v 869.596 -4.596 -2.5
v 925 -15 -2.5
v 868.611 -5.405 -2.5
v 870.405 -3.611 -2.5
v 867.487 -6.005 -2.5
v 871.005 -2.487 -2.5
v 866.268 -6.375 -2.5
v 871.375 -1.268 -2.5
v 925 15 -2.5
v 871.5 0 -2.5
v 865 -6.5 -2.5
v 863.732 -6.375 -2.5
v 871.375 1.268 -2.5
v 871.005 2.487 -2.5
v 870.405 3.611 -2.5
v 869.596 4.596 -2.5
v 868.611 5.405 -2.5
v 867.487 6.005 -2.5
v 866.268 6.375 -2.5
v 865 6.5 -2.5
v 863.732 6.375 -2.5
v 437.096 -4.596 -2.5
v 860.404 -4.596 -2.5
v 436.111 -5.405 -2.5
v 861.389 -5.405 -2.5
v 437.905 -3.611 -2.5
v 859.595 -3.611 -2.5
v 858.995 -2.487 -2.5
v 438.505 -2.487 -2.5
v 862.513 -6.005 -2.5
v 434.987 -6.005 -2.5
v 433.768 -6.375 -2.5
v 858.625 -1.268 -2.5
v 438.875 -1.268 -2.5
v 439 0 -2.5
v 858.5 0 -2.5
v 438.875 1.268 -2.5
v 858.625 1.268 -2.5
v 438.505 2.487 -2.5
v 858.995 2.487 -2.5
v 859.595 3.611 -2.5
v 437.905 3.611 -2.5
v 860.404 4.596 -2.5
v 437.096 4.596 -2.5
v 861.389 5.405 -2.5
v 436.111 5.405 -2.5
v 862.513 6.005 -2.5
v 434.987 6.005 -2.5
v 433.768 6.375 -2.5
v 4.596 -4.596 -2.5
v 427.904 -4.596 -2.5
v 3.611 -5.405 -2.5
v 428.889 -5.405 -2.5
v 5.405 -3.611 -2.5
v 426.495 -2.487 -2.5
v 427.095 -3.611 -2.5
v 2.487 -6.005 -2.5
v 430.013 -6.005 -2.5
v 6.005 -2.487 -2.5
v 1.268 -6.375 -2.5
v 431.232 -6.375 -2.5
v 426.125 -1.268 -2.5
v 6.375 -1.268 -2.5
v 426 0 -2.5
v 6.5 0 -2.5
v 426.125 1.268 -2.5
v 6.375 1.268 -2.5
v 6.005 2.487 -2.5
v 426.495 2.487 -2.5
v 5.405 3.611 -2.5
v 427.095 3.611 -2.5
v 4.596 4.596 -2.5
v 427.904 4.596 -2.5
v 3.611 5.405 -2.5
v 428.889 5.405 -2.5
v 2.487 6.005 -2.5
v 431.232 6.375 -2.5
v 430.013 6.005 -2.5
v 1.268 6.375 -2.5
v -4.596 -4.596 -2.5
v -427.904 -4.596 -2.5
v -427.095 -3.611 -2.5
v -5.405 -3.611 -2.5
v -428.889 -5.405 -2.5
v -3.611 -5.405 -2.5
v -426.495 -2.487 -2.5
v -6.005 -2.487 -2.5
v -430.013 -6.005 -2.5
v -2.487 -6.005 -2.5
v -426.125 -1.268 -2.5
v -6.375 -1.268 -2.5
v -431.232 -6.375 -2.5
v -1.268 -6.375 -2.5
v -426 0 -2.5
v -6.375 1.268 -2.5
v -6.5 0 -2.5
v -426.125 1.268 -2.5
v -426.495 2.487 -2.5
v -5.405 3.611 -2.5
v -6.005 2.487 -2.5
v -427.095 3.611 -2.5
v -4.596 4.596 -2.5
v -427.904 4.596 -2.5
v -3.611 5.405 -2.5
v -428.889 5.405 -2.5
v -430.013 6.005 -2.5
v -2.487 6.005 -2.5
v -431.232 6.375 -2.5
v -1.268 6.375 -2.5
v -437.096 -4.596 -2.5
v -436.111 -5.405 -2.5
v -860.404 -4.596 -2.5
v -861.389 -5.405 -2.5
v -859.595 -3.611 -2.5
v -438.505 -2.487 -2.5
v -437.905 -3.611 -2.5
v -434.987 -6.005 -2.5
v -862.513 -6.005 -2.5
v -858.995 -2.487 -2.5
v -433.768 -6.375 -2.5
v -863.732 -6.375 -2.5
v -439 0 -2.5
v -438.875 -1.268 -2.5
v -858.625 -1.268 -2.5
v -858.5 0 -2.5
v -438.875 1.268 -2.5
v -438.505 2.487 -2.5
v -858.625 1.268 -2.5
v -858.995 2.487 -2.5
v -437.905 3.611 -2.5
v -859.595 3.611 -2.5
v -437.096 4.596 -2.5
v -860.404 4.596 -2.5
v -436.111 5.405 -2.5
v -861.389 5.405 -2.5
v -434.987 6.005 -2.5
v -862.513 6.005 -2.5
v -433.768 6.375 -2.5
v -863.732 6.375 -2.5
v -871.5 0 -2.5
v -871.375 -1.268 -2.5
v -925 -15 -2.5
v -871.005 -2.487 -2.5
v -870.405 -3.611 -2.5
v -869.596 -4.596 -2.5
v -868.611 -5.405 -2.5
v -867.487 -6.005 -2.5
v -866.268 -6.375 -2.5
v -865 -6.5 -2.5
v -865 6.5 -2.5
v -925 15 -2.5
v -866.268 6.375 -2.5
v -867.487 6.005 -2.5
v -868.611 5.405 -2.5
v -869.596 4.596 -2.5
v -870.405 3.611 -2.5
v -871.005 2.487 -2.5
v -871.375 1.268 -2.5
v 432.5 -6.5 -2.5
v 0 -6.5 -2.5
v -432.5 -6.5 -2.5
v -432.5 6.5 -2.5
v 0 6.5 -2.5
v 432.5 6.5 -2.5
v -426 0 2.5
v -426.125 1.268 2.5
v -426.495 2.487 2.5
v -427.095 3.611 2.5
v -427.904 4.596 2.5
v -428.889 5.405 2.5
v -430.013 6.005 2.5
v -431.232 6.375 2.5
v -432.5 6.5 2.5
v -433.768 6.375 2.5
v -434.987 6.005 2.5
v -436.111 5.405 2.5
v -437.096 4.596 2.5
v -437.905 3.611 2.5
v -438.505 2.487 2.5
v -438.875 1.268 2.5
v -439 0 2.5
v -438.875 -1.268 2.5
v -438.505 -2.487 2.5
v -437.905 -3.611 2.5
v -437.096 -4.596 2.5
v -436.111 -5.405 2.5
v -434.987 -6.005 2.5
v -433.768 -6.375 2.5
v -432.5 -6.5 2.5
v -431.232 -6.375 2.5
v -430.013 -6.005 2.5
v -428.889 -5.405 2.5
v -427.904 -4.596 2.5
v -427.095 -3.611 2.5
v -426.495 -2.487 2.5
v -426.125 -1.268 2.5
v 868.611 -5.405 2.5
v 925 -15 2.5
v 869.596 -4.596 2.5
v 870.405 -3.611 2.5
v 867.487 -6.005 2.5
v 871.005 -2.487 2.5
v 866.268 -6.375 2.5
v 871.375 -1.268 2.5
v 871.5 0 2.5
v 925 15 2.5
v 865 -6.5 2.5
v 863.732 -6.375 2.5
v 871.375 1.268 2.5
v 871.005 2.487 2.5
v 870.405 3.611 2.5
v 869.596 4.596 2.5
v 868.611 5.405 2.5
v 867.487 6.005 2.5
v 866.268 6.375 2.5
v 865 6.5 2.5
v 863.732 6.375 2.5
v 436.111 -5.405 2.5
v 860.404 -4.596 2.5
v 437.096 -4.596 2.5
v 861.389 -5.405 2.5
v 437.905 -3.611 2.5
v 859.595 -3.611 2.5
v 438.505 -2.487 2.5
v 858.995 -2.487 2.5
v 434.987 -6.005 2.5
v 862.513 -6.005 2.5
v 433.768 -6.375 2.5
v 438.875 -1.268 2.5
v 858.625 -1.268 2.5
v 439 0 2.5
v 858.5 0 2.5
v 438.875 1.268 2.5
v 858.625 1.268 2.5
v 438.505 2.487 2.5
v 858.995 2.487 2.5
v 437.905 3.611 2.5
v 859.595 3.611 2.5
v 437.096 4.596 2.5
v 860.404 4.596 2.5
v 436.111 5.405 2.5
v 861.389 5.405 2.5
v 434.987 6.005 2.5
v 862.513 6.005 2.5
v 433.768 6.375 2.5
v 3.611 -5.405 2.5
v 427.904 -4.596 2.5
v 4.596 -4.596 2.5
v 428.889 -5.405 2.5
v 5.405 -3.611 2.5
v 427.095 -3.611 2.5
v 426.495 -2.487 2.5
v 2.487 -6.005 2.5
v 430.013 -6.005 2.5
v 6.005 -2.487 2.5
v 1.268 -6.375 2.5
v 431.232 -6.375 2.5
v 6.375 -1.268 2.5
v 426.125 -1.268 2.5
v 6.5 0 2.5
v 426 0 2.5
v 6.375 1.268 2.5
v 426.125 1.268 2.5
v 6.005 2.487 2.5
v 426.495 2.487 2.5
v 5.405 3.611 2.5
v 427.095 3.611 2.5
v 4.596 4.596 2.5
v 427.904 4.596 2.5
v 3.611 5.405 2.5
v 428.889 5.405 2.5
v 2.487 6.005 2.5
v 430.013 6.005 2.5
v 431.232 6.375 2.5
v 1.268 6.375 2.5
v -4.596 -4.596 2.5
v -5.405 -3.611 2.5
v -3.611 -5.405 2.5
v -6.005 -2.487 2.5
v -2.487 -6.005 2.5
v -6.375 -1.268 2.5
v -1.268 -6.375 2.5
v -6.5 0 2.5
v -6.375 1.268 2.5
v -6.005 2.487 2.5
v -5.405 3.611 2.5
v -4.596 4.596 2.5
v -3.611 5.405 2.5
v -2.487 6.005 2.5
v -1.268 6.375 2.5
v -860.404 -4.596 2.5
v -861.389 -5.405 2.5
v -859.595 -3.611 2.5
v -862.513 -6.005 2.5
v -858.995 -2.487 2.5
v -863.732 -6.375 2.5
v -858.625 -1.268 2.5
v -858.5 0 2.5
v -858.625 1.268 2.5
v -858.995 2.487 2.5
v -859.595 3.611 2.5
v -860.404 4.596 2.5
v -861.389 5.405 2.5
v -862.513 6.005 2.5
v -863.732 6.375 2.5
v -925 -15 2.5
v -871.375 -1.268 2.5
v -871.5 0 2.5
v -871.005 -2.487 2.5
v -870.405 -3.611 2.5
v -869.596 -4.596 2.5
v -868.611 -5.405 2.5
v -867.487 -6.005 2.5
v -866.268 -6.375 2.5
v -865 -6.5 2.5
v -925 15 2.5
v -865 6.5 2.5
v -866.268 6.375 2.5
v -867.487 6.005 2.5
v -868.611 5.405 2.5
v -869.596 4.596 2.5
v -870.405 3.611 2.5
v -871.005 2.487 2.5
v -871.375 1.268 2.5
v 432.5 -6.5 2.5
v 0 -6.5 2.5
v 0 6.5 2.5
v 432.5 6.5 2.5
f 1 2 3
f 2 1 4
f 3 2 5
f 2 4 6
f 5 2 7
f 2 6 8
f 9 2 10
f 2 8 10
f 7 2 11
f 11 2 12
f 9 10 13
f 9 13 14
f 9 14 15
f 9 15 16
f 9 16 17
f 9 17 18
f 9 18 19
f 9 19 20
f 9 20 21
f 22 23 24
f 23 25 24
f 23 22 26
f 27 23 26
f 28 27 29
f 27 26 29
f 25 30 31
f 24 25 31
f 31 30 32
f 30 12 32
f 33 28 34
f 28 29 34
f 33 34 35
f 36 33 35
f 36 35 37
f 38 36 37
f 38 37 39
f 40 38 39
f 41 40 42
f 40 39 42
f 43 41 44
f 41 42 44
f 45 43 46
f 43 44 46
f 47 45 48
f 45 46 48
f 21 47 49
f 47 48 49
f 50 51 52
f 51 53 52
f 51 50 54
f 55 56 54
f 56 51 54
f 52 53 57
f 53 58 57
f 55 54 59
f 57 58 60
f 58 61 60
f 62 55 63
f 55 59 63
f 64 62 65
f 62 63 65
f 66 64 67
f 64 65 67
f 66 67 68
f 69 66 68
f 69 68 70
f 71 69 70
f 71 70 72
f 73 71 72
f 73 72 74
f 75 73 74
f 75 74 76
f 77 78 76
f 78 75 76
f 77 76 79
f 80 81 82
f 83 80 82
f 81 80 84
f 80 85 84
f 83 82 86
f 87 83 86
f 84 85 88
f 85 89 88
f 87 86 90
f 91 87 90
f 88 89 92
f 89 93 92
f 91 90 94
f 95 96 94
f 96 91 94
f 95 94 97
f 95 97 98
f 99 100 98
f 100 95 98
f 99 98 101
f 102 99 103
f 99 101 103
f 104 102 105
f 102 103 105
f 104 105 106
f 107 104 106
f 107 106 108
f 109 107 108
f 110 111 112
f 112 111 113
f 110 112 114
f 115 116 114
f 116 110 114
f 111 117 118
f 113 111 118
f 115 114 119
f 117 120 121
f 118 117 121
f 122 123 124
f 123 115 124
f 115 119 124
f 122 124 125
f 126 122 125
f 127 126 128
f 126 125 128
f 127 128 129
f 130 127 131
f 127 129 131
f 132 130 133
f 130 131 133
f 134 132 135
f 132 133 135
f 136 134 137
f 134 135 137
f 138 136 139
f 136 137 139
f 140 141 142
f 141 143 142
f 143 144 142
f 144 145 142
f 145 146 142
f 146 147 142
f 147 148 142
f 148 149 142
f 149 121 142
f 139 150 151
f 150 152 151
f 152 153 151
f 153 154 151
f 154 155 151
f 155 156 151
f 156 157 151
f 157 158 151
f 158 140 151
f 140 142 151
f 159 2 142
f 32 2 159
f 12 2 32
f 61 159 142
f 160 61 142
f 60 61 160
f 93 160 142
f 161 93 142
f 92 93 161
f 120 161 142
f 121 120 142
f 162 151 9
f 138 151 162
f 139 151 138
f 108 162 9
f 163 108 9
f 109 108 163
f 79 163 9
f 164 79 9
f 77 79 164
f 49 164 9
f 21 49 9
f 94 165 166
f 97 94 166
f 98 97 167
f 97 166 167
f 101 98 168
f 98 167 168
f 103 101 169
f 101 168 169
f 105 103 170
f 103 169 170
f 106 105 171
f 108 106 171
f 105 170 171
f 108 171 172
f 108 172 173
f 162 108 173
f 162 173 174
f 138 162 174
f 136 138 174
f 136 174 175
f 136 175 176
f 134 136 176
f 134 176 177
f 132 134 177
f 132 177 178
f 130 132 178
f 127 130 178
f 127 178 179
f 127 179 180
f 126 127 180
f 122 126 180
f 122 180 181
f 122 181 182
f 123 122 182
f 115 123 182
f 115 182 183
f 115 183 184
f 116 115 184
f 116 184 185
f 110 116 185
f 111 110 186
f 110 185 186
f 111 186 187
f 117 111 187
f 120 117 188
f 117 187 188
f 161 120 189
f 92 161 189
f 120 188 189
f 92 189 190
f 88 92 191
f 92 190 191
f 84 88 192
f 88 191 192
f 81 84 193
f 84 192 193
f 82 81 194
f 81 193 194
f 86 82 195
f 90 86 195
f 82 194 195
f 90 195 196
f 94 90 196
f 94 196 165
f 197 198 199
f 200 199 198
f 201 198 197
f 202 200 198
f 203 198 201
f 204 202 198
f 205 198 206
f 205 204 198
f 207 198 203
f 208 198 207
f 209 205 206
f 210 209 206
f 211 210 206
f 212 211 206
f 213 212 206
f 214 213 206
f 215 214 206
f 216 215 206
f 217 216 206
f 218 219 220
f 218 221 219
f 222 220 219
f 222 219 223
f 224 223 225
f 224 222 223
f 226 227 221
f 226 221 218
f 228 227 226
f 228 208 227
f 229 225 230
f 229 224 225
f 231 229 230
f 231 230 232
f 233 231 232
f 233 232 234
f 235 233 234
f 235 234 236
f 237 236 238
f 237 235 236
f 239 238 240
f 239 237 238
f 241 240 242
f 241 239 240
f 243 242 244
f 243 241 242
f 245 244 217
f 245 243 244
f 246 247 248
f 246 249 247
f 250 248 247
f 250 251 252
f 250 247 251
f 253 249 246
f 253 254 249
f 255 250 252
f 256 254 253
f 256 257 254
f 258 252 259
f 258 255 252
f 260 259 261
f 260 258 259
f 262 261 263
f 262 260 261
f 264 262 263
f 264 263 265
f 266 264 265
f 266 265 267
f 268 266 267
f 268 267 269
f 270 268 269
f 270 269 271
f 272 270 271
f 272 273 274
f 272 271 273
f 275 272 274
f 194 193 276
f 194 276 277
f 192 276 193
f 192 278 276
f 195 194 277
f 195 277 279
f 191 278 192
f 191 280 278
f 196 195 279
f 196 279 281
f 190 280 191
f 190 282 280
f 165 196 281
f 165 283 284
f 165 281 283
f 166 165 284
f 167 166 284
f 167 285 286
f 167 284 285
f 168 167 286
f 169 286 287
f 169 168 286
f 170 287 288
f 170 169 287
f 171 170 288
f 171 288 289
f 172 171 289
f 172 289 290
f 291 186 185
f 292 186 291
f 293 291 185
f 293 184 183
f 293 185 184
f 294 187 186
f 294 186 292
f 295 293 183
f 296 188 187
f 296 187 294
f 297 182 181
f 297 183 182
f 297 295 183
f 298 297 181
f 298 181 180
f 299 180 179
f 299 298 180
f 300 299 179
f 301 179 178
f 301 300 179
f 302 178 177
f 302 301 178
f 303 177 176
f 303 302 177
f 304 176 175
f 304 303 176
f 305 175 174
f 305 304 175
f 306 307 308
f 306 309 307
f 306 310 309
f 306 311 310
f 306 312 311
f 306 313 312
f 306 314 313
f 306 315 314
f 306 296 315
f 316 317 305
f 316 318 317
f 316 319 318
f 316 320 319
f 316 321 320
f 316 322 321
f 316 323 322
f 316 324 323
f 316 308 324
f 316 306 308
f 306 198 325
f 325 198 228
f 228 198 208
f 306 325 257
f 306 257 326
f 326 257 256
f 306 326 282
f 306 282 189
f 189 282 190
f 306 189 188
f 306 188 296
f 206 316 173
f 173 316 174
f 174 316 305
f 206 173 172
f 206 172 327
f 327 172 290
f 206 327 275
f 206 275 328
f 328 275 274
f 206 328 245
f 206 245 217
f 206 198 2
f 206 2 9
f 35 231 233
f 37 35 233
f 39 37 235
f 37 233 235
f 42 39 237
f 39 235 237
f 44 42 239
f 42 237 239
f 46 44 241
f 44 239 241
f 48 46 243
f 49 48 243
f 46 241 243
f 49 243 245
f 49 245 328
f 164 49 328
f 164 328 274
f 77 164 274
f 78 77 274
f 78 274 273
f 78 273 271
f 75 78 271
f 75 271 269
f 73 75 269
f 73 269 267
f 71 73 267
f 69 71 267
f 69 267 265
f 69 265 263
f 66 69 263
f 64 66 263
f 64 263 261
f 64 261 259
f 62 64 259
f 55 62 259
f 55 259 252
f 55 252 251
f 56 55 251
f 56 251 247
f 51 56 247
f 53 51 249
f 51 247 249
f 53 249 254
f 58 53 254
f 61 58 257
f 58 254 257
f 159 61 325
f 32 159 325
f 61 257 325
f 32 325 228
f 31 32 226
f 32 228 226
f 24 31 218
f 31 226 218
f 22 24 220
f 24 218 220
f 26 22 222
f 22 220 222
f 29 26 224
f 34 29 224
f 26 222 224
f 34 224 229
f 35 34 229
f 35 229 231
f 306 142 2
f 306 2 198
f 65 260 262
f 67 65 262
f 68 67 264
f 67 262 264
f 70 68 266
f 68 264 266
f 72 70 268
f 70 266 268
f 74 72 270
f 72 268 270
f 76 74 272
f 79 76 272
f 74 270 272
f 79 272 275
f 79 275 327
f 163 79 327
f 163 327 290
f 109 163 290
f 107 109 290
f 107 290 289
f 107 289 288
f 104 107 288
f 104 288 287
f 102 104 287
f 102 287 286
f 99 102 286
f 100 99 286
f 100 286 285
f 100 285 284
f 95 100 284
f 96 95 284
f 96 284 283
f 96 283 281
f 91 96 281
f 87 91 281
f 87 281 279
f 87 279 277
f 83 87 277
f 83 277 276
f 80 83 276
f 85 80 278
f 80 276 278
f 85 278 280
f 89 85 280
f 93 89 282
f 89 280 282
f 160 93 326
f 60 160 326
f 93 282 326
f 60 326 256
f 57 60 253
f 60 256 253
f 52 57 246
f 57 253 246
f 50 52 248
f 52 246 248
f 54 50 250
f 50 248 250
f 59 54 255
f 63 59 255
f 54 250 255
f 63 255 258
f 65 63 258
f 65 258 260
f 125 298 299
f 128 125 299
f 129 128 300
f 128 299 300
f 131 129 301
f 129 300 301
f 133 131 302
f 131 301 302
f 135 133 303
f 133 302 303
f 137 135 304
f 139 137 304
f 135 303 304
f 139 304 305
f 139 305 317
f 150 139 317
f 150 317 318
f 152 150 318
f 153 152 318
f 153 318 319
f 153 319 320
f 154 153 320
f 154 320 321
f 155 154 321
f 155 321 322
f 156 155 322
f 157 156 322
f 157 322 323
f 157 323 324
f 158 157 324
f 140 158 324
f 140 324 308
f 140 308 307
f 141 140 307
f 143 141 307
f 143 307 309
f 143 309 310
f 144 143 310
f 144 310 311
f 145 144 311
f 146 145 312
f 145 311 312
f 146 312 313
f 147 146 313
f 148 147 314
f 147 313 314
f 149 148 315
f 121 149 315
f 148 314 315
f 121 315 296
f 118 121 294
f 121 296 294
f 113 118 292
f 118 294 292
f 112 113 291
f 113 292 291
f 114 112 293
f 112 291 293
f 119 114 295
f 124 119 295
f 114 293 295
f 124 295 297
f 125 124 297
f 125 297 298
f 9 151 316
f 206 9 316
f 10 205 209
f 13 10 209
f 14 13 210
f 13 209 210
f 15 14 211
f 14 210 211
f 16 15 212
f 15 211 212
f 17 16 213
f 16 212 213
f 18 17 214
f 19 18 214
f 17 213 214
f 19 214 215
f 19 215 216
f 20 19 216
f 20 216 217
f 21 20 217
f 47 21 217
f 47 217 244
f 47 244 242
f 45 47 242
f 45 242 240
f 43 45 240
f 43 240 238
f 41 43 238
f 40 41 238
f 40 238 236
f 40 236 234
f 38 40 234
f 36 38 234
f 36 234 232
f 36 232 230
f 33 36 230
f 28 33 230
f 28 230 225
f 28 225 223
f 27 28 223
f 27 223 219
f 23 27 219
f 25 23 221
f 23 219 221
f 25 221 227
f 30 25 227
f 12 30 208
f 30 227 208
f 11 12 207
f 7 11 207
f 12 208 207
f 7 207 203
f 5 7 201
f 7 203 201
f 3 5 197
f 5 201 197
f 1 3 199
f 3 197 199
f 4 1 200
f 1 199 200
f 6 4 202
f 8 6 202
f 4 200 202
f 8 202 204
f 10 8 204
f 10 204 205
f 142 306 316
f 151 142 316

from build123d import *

# Parameters (mm, degrees)
PLAT_W                          = 30
PLAT_H                          = 5
EL_MENT_M_CANO_SOUD_1_DEPTH     = 1850
DIAM_TRE_DU_PER_AGE_13_0_13_1_D = 13
R_P_TITION_LIN_AIRE2_COUNT      = 5
R_P_TITION_LIN_AIRE2_PITCH      = 432.5


with BuildPart() as part:
    # plat → Elément mécano-soudé1 (new body)
    with BuildSketch(Plane.YZ.offset(-925)):
        Rectangle(PLAT_W, PLAT_H)
    extrude(amount=EL_MENT_M_CANO_SOUD_1_DEPTH)

    # Diamètre du perçage Ø13.0 (13)1 (through all)
    with Locations(Plane(origin=(0, 0, -2.5), x_dir=(-1, 0, 0), z_dir=(0, 0, -1))):
        with Locations((865, 0)):
            diam_tre_du_per_age_13_0_13_1 = Hole(DIAM_TRE_DU_PER_AGE_13_0_13_1_D / 2)

    # Répétition linéaire2: Diamètre du perçage Ø13.0 (13)1 ×5
    with Locations(*[(i * R_P_TITION_LIN_AIRE2_PITCH, 0, 0) for i in range(1, R_P_TITION_LIN_AIRE2_COUNT)]):
        add(diam_tre_du_per_age_13_0_13_1, mode=Mode.SUBTRACT)


solid = part.part
